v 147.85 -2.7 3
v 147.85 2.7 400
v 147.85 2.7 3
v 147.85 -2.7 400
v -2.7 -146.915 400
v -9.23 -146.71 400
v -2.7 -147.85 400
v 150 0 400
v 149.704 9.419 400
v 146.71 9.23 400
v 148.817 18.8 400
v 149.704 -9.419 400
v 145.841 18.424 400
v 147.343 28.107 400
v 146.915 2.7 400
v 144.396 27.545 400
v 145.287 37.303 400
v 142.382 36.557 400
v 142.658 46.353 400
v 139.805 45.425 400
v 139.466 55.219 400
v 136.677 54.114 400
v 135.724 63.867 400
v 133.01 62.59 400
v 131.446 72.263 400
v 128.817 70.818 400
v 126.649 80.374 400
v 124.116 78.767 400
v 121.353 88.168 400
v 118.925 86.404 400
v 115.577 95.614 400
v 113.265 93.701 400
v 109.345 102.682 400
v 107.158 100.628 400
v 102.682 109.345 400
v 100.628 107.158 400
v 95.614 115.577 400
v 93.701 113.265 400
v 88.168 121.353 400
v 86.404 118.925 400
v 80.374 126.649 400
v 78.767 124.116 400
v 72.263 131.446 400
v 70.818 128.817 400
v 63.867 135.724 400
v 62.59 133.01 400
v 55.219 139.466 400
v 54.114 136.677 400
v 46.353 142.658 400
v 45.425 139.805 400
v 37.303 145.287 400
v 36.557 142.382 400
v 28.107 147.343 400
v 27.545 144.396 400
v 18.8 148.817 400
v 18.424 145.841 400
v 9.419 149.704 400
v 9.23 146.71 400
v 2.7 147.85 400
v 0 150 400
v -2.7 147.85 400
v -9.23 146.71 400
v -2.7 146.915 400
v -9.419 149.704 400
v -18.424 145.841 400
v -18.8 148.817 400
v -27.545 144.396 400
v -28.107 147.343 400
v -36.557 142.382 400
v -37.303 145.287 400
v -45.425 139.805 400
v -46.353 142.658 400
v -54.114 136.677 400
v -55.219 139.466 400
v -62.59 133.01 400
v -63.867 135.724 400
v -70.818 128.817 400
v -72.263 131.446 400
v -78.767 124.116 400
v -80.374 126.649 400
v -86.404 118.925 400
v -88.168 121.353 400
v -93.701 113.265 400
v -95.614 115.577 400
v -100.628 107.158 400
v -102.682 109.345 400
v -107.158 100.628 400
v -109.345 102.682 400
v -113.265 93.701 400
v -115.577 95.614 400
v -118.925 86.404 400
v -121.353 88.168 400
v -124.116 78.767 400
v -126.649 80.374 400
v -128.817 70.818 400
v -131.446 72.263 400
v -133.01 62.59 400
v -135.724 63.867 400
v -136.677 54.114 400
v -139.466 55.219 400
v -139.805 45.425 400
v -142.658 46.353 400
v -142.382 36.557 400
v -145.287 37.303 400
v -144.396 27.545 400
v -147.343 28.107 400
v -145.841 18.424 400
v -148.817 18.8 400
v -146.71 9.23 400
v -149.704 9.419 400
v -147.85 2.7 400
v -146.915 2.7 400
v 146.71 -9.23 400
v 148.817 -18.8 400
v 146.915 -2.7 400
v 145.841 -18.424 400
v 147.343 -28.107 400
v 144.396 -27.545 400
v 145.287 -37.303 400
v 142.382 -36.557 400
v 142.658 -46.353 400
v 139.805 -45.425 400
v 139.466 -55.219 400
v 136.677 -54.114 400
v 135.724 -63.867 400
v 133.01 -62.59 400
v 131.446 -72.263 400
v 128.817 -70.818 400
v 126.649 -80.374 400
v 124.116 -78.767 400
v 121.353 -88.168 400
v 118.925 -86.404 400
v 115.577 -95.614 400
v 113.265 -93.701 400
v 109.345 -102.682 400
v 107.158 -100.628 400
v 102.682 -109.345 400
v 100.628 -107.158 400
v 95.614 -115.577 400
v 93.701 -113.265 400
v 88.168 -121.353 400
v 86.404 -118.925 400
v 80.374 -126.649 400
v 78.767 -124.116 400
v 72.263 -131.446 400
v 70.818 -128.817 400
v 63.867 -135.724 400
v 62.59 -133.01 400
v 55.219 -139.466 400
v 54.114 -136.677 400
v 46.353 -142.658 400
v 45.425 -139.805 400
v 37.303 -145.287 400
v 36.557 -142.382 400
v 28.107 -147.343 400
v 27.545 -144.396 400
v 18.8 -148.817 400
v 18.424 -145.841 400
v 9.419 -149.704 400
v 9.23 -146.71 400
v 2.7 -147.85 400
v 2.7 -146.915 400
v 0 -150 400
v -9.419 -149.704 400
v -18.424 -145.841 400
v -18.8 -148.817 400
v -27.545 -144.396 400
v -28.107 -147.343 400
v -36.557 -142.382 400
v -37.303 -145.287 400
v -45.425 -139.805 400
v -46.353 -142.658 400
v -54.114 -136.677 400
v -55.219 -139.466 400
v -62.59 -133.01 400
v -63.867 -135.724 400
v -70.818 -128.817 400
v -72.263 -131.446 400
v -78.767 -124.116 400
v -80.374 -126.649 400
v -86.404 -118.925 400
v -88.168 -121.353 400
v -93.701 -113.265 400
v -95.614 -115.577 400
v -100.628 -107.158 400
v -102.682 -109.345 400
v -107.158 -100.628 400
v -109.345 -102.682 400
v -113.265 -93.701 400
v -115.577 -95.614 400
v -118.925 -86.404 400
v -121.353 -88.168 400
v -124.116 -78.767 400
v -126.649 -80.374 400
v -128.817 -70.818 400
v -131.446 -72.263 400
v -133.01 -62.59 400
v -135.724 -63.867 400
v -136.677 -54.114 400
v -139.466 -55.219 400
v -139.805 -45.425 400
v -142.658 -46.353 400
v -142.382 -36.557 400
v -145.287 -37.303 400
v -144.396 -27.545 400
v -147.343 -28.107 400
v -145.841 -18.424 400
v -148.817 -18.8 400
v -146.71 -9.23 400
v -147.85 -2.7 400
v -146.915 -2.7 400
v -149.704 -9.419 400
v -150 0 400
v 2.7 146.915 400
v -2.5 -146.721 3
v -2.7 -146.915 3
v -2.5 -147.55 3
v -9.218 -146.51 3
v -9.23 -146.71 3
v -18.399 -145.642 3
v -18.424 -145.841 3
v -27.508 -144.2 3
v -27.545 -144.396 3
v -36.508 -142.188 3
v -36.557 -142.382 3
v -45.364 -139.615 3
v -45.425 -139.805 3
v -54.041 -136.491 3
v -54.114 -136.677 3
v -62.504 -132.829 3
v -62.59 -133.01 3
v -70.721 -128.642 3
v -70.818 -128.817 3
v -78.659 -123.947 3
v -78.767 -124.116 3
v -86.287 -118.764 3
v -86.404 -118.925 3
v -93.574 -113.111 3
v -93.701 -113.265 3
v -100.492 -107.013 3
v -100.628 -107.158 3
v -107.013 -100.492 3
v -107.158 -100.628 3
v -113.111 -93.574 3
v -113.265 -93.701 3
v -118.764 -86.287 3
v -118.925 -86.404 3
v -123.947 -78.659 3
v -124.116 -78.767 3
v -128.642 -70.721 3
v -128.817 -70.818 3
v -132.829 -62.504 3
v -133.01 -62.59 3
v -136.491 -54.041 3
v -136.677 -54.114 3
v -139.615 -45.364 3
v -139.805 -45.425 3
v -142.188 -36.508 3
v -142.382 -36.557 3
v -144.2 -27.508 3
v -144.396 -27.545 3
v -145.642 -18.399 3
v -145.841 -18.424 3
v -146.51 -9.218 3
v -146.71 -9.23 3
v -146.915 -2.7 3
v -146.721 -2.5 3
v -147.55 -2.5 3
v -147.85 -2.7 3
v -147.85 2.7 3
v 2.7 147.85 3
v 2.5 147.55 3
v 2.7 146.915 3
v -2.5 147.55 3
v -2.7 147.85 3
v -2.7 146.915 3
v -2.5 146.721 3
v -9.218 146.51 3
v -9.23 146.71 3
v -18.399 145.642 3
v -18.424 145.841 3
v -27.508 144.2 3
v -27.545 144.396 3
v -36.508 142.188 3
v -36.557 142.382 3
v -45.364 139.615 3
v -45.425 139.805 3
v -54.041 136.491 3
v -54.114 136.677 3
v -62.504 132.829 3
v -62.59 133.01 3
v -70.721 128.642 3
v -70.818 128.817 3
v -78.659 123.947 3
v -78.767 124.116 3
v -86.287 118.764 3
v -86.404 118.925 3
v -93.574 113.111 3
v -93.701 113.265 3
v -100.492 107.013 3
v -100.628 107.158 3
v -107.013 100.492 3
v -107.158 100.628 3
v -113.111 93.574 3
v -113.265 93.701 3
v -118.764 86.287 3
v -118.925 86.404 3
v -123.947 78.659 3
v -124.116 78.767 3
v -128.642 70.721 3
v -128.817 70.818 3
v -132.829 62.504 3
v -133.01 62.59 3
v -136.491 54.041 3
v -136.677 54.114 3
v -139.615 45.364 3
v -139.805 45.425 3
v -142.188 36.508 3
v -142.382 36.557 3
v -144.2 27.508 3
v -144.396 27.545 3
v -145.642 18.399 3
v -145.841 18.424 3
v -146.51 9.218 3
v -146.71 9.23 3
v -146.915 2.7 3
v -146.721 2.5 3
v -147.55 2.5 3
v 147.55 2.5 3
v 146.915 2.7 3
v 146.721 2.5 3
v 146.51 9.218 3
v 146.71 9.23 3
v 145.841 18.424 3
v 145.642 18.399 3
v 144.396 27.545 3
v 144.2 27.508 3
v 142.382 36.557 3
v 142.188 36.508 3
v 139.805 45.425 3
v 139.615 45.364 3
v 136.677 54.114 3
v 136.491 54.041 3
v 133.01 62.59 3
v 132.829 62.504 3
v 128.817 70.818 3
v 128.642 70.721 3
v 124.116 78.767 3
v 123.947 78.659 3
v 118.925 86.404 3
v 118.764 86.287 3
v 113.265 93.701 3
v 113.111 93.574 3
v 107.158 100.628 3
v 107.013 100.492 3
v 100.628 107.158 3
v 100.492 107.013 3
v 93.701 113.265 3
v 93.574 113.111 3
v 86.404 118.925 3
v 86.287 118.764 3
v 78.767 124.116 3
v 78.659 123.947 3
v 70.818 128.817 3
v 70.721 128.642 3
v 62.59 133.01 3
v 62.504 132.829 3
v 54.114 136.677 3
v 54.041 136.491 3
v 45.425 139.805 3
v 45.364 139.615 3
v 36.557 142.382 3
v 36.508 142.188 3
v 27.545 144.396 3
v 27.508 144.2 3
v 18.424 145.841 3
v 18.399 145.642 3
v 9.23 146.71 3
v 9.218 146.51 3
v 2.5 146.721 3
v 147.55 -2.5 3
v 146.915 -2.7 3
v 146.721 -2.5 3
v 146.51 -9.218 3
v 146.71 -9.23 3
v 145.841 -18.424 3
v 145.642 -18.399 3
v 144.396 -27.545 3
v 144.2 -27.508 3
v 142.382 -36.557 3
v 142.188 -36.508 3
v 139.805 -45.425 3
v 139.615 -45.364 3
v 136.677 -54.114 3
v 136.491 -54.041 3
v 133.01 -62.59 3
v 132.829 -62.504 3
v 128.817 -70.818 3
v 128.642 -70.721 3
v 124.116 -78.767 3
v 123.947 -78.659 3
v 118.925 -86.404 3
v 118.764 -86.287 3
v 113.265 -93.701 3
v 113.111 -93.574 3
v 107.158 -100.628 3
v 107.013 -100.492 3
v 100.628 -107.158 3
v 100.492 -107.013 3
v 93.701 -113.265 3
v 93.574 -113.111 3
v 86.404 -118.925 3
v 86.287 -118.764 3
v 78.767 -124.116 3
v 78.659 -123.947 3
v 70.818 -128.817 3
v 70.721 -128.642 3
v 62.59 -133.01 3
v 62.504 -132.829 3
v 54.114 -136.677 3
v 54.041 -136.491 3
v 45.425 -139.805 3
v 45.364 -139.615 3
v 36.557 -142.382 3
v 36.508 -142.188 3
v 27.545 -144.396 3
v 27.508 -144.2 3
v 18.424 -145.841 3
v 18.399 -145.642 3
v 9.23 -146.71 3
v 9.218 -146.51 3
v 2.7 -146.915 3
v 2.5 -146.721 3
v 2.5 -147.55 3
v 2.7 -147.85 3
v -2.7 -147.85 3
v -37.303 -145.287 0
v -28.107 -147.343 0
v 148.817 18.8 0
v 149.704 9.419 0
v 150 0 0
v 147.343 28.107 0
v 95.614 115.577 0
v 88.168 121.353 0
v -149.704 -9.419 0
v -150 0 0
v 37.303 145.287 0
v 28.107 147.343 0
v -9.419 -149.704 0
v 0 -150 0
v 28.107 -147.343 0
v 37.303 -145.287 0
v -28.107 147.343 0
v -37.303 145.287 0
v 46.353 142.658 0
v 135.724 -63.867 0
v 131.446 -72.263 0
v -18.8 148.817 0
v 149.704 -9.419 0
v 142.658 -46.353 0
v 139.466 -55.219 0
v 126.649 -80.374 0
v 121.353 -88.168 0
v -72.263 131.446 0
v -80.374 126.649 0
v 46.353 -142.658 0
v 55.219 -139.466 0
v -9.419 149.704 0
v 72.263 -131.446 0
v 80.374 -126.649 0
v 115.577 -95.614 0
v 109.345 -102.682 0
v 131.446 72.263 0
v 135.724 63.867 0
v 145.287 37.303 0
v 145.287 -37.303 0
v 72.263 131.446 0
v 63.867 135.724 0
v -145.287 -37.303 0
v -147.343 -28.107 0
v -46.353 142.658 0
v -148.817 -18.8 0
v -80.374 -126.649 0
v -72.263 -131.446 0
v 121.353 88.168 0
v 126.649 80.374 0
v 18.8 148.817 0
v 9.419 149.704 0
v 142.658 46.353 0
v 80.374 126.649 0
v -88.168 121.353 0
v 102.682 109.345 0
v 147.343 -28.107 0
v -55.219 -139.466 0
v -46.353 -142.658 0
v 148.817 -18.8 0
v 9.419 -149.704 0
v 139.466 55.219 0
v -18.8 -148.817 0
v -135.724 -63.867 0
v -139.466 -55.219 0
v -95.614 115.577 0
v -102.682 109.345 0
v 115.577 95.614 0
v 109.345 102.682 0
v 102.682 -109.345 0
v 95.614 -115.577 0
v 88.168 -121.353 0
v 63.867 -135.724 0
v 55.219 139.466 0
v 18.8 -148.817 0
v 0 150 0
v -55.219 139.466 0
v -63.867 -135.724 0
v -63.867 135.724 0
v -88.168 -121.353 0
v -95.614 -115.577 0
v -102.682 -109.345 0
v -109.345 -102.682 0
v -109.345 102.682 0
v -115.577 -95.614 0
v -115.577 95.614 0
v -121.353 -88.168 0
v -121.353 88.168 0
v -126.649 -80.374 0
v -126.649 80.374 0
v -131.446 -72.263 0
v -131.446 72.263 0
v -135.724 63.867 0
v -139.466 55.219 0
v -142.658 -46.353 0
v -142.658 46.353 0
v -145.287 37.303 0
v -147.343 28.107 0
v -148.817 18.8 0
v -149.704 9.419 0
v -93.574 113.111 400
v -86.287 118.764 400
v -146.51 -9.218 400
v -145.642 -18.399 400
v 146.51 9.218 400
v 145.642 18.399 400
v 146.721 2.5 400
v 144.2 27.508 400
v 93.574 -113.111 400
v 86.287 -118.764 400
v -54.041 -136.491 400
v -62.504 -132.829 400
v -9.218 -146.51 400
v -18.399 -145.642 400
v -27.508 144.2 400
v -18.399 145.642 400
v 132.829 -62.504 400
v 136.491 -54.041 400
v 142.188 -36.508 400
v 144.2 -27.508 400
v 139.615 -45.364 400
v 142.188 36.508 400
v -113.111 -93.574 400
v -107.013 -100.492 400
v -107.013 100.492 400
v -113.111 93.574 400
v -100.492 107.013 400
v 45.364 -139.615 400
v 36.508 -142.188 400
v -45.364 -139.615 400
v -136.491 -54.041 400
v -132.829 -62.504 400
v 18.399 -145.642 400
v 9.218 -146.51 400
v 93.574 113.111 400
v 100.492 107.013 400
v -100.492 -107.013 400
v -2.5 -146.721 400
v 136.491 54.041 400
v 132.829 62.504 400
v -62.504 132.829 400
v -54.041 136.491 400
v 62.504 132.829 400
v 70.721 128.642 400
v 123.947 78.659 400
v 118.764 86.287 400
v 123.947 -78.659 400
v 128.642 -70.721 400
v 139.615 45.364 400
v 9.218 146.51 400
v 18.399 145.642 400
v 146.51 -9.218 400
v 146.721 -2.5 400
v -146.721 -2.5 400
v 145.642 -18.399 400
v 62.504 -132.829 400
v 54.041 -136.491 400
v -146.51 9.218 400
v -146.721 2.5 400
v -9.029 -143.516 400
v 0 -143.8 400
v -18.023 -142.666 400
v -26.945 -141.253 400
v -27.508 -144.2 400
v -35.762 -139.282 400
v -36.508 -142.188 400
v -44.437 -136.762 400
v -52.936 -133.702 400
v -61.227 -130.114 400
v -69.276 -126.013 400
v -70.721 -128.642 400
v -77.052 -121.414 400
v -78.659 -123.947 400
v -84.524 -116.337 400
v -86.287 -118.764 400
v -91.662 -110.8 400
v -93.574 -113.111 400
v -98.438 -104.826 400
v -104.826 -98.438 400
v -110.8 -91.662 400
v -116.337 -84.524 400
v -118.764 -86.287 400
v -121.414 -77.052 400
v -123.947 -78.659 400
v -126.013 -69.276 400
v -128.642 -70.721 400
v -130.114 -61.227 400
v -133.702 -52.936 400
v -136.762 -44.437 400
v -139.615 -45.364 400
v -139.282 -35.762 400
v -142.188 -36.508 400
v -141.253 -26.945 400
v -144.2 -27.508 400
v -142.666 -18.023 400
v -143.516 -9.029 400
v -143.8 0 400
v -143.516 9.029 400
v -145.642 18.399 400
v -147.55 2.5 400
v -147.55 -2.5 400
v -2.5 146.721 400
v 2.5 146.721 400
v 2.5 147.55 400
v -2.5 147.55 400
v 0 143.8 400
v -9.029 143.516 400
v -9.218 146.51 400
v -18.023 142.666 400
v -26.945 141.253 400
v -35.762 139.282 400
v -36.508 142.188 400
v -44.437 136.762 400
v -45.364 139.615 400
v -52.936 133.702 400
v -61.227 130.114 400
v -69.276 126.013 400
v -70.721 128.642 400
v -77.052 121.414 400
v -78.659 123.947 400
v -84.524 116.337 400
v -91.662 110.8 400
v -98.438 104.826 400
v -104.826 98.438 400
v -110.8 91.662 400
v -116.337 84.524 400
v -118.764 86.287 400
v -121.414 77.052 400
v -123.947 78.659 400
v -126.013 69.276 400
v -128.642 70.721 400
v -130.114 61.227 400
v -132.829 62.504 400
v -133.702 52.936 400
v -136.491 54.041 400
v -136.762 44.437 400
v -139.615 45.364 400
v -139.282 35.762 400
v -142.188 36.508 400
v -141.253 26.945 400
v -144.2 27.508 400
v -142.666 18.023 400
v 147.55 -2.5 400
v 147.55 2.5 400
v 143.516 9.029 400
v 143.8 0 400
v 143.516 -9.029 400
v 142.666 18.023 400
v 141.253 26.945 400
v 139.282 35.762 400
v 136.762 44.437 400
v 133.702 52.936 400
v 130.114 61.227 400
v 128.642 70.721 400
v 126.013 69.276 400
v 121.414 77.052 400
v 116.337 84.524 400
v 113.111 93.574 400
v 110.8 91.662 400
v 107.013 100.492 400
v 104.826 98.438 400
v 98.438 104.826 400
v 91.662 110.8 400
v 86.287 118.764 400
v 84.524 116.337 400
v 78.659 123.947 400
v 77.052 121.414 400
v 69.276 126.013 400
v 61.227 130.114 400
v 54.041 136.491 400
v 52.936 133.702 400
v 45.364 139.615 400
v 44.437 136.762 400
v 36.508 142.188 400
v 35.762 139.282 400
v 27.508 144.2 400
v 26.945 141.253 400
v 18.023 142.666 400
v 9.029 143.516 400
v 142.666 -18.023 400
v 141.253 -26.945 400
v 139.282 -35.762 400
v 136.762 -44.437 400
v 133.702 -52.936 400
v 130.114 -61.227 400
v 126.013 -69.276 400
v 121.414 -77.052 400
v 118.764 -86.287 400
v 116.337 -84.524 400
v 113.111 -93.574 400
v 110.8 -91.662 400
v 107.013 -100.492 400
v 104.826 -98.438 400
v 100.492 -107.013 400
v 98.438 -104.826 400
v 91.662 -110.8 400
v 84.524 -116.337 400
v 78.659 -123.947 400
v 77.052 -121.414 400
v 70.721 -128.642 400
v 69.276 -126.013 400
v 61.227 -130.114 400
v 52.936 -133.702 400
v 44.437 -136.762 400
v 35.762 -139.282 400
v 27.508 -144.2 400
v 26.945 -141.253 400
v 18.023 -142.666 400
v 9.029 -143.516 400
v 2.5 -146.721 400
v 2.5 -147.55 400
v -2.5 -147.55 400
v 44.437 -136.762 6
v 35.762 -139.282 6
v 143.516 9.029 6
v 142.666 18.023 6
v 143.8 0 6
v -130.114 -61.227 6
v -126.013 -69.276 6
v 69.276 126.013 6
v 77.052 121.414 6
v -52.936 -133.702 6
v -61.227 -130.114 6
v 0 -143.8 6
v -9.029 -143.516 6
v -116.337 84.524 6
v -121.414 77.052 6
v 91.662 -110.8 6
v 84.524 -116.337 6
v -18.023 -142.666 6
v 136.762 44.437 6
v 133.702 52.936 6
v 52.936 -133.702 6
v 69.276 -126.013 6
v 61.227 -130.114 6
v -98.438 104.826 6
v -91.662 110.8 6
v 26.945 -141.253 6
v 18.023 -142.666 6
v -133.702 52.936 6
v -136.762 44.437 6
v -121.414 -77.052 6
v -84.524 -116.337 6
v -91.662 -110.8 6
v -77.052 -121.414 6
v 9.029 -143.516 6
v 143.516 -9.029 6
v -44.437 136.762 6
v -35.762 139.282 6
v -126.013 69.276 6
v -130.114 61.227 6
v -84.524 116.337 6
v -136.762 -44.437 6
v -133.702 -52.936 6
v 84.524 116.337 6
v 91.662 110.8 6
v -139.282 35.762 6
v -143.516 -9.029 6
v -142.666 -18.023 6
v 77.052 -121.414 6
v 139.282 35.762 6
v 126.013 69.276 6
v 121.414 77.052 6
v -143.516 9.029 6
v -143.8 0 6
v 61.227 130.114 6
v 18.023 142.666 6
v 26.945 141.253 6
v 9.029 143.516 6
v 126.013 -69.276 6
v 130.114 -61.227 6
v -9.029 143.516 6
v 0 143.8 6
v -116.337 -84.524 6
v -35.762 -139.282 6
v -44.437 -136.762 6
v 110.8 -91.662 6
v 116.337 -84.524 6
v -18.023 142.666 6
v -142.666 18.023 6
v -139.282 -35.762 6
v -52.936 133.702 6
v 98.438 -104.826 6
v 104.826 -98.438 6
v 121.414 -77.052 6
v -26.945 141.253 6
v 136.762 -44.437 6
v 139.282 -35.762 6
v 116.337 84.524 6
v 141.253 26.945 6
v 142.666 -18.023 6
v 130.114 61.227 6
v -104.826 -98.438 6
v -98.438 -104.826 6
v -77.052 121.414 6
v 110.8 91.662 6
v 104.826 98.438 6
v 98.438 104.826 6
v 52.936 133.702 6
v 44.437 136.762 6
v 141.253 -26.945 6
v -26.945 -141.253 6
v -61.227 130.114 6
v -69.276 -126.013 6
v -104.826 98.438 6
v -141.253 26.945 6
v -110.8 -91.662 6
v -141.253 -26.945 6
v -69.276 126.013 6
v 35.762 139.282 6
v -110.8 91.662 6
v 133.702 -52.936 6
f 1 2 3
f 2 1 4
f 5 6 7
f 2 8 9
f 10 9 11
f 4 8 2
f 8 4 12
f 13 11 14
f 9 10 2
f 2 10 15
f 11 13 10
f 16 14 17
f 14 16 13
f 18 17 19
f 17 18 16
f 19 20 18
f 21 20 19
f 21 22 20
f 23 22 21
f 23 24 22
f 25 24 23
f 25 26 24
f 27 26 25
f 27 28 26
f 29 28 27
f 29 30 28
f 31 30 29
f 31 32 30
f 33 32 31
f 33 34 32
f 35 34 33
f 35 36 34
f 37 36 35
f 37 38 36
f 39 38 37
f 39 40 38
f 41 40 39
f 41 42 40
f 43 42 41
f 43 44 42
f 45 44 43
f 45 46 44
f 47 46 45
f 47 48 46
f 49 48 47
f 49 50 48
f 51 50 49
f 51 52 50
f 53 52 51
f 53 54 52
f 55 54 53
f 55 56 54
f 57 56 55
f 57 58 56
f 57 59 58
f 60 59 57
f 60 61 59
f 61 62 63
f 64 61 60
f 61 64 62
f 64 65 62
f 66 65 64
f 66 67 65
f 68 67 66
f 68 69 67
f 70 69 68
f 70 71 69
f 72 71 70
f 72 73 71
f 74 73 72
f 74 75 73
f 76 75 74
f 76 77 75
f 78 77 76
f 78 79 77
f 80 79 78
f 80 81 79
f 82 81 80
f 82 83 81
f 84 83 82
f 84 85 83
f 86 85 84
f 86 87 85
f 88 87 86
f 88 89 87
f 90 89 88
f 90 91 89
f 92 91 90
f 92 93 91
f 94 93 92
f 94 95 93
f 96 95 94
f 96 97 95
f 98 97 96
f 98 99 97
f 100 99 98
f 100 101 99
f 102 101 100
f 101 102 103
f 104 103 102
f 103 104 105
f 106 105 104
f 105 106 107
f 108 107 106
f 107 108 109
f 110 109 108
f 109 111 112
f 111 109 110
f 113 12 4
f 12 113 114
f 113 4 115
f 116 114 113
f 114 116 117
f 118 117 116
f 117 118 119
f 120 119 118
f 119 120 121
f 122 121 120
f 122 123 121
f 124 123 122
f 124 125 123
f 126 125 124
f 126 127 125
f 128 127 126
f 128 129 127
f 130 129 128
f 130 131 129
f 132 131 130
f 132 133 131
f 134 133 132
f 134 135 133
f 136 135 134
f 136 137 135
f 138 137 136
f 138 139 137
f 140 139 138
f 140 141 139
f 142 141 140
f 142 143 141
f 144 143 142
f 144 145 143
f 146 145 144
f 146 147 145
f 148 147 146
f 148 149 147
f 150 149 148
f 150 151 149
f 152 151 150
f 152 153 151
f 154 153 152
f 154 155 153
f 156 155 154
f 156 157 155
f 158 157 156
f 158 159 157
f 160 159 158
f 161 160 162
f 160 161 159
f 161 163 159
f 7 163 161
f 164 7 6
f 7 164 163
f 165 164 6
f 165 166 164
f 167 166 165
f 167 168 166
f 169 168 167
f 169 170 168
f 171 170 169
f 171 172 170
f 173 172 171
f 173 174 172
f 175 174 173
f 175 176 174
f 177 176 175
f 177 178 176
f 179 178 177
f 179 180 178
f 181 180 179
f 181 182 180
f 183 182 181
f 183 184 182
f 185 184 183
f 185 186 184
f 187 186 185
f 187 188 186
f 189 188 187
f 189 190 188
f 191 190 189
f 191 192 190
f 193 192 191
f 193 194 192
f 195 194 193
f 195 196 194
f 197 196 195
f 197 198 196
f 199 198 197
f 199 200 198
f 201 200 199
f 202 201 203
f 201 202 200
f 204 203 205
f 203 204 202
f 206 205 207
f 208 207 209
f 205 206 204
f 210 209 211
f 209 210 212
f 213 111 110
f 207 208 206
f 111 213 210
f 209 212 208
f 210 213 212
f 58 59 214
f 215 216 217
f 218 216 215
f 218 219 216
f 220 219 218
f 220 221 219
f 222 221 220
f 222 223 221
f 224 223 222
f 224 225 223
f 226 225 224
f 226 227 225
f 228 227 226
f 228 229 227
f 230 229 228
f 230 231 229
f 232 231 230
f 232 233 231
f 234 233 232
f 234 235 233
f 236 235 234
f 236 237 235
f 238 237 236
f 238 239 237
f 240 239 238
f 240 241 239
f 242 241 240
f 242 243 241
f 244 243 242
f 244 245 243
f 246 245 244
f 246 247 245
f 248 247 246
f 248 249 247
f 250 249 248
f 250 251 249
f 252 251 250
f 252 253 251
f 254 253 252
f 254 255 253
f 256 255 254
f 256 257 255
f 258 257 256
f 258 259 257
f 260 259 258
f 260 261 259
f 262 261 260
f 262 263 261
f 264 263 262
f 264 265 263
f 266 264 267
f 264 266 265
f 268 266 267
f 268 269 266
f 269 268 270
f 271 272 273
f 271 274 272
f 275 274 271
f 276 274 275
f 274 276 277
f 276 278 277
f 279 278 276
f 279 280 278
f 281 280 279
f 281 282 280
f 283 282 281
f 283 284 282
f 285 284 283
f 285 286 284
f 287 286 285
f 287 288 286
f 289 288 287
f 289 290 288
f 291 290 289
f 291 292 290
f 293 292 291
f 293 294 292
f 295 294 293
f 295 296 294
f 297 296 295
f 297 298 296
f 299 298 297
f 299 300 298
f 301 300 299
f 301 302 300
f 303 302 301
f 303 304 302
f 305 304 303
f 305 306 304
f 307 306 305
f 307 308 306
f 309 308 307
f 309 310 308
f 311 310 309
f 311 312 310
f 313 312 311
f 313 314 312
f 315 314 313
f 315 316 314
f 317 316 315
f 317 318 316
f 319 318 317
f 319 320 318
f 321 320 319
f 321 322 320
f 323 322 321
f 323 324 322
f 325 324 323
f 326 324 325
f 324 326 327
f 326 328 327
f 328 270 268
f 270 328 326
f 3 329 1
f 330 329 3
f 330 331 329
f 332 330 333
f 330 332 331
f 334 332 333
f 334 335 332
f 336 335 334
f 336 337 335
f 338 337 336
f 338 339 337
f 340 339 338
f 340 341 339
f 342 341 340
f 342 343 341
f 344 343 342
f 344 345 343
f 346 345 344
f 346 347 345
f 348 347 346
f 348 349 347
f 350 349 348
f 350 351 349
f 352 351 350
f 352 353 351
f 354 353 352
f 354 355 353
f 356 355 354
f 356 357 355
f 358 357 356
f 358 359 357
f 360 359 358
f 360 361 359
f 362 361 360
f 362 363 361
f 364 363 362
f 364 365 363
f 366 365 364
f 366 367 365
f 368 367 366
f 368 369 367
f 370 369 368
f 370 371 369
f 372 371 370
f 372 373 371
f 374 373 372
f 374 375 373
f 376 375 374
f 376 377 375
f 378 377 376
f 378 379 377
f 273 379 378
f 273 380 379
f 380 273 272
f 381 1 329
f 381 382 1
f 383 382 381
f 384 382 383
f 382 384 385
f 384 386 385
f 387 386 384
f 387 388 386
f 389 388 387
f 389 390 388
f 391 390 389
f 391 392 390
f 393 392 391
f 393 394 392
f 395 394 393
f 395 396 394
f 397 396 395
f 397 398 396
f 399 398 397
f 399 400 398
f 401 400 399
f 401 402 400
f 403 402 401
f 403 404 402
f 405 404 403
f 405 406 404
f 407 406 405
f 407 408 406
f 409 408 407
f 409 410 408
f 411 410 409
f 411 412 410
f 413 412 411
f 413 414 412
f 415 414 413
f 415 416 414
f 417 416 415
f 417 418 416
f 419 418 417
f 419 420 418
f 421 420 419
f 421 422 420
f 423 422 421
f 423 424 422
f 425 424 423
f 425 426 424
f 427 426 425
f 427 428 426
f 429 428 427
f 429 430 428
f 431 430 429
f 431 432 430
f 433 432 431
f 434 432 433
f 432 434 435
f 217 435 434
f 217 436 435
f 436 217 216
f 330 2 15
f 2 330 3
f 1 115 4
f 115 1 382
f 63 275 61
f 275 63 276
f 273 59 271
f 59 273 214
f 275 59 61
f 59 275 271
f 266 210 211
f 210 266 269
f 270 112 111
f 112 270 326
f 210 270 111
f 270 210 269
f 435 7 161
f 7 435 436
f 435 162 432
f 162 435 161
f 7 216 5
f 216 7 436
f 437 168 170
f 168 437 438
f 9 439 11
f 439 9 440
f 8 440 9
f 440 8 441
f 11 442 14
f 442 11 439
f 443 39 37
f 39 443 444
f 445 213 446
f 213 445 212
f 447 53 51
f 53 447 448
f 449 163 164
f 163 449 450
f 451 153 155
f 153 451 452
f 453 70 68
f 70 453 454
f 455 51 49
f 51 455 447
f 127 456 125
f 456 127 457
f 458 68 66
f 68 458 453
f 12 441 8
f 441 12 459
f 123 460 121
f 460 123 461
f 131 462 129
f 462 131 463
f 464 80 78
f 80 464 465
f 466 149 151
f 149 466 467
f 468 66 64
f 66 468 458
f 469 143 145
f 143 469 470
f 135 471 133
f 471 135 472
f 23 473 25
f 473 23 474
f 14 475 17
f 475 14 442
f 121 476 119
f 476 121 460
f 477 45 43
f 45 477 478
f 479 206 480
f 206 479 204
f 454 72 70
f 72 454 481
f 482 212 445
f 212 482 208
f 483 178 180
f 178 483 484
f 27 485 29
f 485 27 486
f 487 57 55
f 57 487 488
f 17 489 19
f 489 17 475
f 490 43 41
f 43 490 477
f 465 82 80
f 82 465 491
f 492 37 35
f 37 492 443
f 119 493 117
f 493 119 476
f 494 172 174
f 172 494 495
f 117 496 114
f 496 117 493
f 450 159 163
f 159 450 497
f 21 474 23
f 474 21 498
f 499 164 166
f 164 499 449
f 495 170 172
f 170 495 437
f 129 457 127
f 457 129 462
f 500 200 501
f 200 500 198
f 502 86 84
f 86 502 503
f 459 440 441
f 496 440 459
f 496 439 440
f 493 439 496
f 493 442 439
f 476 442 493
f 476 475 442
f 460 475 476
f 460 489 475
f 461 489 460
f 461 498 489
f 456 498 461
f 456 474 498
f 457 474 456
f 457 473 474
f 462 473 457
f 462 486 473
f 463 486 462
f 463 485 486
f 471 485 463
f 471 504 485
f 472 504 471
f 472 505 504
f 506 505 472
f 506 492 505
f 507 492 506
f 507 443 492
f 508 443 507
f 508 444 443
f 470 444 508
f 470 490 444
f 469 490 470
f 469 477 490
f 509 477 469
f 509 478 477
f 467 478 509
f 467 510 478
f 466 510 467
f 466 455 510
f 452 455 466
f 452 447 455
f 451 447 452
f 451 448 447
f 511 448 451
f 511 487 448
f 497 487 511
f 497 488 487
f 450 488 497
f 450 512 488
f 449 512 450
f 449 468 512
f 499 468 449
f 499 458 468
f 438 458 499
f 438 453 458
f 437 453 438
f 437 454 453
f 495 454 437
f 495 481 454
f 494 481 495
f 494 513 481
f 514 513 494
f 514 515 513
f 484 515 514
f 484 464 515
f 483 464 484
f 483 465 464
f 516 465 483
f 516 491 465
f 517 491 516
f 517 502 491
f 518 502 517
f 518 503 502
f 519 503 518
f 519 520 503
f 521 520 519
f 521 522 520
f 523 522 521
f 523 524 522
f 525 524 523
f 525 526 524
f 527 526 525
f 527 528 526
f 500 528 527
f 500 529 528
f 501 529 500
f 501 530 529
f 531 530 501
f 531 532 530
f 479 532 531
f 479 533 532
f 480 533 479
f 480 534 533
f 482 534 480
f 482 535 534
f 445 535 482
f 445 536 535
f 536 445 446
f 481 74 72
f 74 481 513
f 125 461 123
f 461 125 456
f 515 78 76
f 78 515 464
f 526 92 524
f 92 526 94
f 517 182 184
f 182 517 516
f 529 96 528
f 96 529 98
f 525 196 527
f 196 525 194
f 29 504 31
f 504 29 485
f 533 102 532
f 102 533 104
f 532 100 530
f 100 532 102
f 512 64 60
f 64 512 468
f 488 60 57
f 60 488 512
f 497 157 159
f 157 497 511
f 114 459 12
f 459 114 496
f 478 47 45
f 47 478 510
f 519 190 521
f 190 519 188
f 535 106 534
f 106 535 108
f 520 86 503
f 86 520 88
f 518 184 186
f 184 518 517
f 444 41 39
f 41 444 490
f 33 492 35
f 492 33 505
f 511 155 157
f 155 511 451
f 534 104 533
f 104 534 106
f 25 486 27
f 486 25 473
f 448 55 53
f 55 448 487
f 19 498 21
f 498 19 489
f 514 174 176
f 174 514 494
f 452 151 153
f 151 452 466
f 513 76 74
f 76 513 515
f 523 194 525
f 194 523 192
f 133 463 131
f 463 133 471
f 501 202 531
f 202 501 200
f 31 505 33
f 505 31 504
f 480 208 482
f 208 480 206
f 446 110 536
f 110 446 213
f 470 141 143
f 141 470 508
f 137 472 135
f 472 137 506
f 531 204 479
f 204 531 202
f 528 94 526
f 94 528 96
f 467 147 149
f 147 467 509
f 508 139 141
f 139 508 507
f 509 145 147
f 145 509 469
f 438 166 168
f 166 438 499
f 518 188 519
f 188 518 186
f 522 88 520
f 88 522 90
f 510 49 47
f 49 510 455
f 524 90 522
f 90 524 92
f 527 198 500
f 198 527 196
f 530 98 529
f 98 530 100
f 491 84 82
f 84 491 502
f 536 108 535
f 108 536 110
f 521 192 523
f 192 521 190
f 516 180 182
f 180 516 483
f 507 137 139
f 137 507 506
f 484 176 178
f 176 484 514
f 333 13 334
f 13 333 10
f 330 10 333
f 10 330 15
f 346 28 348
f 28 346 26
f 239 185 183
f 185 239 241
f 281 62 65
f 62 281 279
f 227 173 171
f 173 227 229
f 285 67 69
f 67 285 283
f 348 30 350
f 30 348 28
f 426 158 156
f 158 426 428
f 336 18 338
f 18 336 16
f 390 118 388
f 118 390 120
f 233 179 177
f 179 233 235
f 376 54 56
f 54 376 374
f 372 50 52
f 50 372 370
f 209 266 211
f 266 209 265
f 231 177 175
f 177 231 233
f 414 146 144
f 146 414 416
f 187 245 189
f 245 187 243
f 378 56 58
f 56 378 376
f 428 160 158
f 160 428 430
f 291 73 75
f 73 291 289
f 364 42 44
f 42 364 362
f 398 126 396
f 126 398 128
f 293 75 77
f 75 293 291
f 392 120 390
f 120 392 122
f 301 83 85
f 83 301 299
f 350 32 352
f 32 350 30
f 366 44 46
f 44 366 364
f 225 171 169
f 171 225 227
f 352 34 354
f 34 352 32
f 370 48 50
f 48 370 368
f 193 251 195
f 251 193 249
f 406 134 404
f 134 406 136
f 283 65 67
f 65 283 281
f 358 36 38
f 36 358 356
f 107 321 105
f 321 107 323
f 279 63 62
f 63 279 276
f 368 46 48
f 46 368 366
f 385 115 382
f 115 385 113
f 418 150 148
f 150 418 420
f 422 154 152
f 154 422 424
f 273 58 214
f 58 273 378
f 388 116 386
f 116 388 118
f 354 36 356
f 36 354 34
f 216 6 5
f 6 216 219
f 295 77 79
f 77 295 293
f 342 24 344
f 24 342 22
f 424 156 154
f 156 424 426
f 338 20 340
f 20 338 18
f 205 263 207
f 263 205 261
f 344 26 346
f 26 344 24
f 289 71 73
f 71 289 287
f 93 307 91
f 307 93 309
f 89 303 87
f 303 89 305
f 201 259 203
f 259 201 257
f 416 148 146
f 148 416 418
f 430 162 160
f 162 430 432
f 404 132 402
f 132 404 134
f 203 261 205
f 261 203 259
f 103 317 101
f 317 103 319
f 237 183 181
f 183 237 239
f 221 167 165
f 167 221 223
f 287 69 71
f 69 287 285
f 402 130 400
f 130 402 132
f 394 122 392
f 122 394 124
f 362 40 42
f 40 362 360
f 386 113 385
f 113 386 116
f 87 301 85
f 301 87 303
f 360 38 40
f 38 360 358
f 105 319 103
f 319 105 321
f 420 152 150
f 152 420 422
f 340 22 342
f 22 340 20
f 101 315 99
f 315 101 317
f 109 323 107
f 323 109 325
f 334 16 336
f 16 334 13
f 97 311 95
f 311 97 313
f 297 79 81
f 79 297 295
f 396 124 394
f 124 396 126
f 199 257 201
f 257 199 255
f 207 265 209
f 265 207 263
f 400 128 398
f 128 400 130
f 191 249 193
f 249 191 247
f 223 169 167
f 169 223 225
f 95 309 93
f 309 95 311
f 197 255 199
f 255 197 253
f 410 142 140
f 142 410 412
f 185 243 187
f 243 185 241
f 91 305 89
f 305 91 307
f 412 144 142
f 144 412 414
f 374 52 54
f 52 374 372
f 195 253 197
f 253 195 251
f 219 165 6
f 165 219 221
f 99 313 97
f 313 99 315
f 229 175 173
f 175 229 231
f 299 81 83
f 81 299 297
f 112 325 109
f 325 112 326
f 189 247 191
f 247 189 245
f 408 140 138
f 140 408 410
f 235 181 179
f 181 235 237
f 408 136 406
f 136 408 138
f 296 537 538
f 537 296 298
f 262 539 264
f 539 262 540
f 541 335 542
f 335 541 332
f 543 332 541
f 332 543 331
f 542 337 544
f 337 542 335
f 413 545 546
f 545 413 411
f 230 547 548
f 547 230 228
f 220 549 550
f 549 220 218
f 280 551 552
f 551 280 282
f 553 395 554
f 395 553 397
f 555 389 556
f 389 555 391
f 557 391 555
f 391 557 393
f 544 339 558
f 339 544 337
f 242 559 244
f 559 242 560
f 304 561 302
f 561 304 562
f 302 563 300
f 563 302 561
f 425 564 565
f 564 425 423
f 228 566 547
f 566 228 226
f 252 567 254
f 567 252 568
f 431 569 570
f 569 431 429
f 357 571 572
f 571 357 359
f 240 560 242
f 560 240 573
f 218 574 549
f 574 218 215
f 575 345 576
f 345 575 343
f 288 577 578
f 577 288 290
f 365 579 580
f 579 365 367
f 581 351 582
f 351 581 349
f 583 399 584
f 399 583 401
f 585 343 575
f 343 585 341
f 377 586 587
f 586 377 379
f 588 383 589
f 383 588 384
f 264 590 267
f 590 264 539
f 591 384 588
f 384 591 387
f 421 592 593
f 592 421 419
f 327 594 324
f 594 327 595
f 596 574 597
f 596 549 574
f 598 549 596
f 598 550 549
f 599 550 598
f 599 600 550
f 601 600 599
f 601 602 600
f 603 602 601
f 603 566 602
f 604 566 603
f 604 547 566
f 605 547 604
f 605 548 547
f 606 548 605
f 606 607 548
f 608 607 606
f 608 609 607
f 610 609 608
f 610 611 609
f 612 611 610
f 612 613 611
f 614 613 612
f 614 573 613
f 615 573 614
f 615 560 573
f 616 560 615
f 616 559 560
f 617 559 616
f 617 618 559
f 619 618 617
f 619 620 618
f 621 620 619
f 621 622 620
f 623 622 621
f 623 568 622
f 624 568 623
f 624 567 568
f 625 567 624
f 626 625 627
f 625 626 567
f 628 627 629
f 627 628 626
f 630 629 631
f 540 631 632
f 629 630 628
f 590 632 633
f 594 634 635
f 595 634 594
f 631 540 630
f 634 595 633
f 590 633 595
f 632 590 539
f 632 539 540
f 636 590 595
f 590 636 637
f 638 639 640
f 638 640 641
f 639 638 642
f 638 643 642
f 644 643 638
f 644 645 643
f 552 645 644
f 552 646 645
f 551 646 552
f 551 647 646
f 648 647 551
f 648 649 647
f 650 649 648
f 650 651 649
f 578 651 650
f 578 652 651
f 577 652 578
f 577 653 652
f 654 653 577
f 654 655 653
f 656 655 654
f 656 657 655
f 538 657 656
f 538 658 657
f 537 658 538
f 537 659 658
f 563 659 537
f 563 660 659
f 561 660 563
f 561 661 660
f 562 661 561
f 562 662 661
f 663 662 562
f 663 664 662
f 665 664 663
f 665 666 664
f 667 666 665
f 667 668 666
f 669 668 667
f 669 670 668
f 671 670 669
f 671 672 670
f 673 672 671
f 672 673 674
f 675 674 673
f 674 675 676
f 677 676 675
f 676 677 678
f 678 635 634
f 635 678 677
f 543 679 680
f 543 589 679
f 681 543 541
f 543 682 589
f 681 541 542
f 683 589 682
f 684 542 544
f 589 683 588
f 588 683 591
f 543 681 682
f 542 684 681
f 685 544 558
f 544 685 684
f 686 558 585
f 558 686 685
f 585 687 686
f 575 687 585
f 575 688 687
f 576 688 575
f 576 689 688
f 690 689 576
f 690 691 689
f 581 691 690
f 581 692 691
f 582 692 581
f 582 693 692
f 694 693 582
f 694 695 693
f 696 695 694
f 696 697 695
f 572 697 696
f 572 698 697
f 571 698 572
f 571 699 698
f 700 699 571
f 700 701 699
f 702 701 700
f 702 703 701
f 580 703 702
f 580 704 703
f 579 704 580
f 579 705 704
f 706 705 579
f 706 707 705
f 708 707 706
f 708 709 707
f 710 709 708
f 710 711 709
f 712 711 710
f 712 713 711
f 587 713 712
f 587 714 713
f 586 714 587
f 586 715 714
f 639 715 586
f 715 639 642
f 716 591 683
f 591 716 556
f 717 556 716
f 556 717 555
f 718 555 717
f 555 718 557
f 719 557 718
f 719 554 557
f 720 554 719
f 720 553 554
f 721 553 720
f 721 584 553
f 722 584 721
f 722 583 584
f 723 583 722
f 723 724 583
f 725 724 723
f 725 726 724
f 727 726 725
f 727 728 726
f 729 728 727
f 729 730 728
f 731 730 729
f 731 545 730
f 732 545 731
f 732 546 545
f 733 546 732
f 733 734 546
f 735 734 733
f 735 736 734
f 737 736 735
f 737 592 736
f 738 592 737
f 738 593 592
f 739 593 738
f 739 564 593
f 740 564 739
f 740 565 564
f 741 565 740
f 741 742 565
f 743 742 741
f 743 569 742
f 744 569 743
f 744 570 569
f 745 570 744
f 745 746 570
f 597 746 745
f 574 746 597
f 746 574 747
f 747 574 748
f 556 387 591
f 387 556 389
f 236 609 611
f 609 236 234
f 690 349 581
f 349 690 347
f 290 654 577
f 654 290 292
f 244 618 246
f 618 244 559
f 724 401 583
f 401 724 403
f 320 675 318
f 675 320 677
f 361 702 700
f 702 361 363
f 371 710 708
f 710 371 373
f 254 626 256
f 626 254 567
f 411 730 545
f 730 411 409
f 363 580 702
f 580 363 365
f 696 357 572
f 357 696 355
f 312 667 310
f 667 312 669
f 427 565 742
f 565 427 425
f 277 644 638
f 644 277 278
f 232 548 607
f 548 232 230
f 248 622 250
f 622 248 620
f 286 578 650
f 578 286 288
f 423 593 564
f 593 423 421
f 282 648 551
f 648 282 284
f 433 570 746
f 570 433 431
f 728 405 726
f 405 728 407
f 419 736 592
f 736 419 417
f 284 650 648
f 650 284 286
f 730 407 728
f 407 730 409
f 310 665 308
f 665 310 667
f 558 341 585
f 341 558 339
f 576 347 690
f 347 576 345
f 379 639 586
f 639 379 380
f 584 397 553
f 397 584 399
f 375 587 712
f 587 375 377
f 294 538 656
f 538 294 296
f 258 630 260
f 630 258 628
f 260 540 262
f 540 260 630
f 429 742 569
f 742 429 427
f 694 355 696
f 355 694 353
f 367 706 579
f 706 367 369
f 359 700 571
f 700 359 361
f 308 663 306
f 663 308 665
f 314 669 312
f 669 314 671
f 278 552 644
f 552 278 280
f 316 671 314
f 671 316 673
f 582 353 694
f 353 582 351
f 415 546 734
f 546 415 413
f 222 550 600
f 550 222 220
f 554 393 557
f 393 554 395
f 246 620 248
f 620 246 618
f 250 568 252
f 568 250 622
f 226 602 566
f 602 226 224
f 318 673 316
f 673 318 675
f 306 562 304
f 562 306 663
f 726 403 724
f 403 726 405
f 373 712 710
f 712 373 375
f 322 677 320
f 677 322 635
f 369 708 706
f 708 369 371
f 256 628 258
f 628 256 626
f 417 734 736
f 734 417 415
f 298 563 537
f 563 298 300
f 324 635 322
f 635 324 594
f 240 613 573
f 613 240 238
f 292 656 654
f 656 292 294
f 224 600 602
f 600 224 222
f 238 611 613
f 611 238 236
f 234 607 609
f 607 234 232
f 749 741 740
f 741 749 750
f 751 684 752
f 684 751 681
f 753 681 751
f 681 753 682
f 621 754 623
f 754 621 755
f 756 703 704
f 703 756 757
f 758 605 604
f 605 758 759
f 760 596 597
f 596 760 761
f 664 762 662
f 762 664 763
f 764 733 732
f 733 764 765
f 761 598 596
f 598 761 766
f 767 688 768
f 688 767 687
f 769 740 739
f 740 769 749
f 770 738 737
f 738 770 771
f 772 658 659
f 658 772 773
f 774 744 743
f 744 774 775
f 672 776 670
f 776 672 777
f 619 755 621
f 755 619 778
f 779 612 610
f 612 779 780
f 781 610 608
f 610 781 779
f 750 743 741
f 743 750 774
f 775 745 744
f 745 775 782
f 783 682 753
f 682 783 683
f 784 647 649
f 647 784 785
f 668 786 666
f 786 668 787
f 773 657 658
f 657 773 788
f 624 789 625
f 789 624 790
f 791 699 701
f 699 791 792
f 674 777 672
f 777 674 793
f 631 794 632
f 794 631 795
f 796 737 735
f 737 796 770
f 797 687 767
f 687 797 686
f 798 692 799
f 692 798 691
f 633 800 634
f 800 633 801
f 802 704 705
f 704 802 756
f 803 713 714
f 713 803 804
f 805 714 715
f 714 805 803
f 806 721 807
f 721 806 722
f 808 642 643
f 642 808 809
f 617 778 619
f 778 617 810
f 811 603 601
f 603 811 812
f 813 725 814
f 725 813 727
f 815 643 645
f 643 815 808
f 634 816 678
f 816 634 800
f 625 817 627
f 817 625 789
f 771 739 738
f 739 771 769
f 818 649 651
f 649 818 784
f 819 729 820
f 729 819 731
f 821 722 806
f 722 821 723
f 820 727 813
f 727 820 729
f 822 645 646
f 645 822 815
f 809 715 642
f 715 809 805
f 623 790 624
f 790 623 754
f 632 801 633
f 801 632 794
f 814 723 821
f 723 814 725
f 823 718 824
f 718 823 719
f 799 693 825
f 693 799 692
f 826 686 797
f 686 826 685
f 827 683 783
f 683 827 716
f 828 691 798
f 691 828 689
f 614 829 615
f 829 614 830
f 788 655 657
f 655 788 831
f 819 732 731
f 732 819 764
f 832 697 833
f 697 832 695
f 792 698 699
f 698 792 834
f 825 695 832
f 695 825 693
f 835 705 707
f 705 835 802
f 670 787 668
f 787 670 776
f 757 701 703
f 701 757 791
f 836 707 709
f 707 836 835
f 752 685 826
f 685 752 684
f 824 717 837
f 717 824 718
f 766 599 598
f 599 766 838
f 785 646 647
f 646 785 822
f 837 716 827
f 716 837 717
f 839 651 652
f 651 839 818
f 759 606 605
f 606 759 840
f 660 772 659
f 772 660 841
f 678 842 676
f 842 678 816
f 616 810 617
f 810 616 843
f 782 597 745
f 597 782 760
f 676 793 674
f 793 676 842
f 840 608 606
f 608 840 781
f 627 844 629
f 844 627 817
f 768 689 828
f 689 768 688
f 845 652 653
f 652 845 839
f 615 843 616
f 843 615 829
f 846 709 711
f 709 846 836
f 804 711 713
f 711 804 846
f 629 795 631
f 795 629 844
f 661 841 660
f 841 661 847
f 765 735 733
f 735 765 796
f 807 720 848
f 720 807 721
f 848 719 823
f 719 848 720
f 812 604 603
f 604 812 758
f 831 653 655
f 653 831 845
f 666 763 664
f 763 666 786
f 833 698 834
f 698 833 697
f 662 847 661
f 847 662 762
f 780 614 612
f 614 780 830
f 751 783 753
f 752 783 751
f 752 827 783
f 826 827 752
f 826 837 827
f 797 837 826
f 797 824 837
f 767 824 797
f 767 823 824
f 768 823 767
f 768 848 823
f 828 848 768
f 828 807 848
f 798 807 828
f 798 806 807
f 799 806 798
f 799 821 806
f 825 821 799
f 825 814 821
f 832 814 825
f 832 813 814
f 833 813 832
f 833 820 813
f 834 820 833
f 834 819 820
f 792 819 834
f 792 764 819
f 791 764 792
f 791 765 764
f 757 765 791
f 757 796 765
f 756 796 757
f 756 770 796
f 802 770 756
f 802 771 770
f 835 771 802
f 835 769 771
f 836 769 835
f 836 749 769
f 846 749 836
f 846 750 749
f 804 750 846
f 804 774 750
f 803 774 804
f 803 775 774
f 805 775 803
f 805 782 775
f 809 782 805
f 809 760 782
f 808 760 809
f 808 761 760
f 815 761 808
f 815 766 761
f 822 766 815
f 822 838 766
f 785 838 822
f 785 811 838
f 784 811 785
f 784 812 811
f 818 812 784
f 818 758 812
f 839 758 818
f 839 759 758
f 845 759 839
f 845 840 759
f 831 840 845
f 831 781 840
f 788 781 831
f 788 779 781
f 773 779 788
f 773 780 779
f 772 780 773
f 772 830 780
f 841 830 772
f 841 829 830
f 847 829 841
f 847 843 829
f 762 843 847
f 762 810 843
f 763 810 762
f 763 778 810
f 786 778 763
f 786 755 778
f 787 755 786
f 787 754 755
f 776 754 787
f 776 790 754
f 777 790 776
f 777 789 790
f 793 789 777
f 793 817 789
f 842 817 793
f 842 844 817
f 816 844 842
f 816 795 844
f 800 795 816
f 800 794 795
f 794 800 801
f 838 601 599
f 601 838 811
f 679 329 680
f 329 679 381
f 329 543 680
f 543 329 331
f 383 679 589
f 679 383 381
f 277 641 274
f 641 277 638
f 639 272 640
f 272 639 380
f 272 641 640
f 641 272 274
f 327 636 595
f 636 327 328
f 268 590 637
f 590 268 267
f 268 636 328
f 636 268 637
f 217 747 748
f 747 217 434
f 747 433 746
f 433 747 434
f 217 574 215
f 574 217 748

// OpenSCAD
//
// In-Ground Worm Bin - Complete Model
// Generated monolithic file combining all components
//
// This file was automatically generated by combine_files.py
//

// In-Ground Worm Bin - Main Assembly
// Combines all components

// In-Ground Worm Bin - Parameters
// Shared parameters for all components

// Outer shell dimensions
outer_diameter = 300; // mm
outer_height = 400;   // mm
outer_wall_thickness = 3; // mm

// Tolerance between shells
tolerance = 0.2; // mm - adjust based on your printer's accuracy

// Ridge and channel dimensions
ridge_width = 5; // mm
ridge_depth = outer_wall_thickness / 2; // Half the depth of outer shell wall
ridge_count = 4; // Number of ridges/channels around the circumference

// Inner shell dimensions (calculated from outer dimensions and tolerance)
inner_diameter = outer_diameter - 2 * (outer_wall_thickness + tolerance);
inner_height = outer_height - outer_wall_thickness; // Remove tolerance to make tops flush ;
// In-Ground Worm Bin - Outer Shell
// Parameters are imported from parameters.scad

;

// Create a single channel
module channel(height) {
    // Position the channel on the inside wall of the outer shell
    translate([outer_diameter/2 - outer_wall_thickness, 0, (outer_height + outer_wall_thickness)/2])
        cube([ridge_depth + tolerance, ridge_width + tolerance*2, outer_height - outer_wall_thickness], center=true);
}

// Render the outer shell with channels
module outer_shell() {
    difference() {
        cylinder(h = outer_height, d = outer_diameter, center = false, $fn=100);
        
        // Hollow out the inside
        translate([0, 0, outer_wall_thickness])  // Leave bottom wall thickness
            cylinder(h = outer_height, d = outer_diameter - 2 * outer_wall_thickness, center = false, $fn=100);
        
        // Add channels
        for (i = [0:ridge_count-1]) {
            angle = i * 360 / ridge_count;
            rotate([0, 0, angle])
                channel(outer_height);
        }
    }
}

// Only render when this file is opened directly
 ;
// In-Ground Worm Bin - Inner Shell
// Parameters are imported from parameters.scad

;

// Create a single ridge
module ridge(height) {
    translate([inner_diameter/2, 0, height/2])
        cube([ridge_depth, ridge_width, height], center=true);
}

// Render the inner shell with ridges
module inner_shell() {
    union() {
        difference() {
            cylinder(h = inner_height, d = inner_diameter, center = false, $fn=100);
            translate([0, 0, outer_wall_thickness])  // Leave bottom wall thickness
                cylinder(h = inner_height, d = inner_diameter - 2 * outer_wall_thickness, center = false, $fn=100);
        }
        
        // Add ridges
        for (i = [0:ridge_count-1]) {
            angle = i * 360 / ridge_count;
            rotate([0, 0, angle])
                ridge(inner_height);
        }
    }
}

// Only render when this file is opened directly
 ;

// Render both shells
outer_shell();
translate([0, 0, outer_wall_thickness]) // Position inner shell on the bottom of outer shell
    color("LightGreen") inner_shell();

// Add some basic information
echo("Outer shell diameter: ", outer_diameter, "mm");
echo("Inner shell diameter: ", inner_diameter, "mm");
echo("Gap between shells: ", tolerance, "mm"); 
